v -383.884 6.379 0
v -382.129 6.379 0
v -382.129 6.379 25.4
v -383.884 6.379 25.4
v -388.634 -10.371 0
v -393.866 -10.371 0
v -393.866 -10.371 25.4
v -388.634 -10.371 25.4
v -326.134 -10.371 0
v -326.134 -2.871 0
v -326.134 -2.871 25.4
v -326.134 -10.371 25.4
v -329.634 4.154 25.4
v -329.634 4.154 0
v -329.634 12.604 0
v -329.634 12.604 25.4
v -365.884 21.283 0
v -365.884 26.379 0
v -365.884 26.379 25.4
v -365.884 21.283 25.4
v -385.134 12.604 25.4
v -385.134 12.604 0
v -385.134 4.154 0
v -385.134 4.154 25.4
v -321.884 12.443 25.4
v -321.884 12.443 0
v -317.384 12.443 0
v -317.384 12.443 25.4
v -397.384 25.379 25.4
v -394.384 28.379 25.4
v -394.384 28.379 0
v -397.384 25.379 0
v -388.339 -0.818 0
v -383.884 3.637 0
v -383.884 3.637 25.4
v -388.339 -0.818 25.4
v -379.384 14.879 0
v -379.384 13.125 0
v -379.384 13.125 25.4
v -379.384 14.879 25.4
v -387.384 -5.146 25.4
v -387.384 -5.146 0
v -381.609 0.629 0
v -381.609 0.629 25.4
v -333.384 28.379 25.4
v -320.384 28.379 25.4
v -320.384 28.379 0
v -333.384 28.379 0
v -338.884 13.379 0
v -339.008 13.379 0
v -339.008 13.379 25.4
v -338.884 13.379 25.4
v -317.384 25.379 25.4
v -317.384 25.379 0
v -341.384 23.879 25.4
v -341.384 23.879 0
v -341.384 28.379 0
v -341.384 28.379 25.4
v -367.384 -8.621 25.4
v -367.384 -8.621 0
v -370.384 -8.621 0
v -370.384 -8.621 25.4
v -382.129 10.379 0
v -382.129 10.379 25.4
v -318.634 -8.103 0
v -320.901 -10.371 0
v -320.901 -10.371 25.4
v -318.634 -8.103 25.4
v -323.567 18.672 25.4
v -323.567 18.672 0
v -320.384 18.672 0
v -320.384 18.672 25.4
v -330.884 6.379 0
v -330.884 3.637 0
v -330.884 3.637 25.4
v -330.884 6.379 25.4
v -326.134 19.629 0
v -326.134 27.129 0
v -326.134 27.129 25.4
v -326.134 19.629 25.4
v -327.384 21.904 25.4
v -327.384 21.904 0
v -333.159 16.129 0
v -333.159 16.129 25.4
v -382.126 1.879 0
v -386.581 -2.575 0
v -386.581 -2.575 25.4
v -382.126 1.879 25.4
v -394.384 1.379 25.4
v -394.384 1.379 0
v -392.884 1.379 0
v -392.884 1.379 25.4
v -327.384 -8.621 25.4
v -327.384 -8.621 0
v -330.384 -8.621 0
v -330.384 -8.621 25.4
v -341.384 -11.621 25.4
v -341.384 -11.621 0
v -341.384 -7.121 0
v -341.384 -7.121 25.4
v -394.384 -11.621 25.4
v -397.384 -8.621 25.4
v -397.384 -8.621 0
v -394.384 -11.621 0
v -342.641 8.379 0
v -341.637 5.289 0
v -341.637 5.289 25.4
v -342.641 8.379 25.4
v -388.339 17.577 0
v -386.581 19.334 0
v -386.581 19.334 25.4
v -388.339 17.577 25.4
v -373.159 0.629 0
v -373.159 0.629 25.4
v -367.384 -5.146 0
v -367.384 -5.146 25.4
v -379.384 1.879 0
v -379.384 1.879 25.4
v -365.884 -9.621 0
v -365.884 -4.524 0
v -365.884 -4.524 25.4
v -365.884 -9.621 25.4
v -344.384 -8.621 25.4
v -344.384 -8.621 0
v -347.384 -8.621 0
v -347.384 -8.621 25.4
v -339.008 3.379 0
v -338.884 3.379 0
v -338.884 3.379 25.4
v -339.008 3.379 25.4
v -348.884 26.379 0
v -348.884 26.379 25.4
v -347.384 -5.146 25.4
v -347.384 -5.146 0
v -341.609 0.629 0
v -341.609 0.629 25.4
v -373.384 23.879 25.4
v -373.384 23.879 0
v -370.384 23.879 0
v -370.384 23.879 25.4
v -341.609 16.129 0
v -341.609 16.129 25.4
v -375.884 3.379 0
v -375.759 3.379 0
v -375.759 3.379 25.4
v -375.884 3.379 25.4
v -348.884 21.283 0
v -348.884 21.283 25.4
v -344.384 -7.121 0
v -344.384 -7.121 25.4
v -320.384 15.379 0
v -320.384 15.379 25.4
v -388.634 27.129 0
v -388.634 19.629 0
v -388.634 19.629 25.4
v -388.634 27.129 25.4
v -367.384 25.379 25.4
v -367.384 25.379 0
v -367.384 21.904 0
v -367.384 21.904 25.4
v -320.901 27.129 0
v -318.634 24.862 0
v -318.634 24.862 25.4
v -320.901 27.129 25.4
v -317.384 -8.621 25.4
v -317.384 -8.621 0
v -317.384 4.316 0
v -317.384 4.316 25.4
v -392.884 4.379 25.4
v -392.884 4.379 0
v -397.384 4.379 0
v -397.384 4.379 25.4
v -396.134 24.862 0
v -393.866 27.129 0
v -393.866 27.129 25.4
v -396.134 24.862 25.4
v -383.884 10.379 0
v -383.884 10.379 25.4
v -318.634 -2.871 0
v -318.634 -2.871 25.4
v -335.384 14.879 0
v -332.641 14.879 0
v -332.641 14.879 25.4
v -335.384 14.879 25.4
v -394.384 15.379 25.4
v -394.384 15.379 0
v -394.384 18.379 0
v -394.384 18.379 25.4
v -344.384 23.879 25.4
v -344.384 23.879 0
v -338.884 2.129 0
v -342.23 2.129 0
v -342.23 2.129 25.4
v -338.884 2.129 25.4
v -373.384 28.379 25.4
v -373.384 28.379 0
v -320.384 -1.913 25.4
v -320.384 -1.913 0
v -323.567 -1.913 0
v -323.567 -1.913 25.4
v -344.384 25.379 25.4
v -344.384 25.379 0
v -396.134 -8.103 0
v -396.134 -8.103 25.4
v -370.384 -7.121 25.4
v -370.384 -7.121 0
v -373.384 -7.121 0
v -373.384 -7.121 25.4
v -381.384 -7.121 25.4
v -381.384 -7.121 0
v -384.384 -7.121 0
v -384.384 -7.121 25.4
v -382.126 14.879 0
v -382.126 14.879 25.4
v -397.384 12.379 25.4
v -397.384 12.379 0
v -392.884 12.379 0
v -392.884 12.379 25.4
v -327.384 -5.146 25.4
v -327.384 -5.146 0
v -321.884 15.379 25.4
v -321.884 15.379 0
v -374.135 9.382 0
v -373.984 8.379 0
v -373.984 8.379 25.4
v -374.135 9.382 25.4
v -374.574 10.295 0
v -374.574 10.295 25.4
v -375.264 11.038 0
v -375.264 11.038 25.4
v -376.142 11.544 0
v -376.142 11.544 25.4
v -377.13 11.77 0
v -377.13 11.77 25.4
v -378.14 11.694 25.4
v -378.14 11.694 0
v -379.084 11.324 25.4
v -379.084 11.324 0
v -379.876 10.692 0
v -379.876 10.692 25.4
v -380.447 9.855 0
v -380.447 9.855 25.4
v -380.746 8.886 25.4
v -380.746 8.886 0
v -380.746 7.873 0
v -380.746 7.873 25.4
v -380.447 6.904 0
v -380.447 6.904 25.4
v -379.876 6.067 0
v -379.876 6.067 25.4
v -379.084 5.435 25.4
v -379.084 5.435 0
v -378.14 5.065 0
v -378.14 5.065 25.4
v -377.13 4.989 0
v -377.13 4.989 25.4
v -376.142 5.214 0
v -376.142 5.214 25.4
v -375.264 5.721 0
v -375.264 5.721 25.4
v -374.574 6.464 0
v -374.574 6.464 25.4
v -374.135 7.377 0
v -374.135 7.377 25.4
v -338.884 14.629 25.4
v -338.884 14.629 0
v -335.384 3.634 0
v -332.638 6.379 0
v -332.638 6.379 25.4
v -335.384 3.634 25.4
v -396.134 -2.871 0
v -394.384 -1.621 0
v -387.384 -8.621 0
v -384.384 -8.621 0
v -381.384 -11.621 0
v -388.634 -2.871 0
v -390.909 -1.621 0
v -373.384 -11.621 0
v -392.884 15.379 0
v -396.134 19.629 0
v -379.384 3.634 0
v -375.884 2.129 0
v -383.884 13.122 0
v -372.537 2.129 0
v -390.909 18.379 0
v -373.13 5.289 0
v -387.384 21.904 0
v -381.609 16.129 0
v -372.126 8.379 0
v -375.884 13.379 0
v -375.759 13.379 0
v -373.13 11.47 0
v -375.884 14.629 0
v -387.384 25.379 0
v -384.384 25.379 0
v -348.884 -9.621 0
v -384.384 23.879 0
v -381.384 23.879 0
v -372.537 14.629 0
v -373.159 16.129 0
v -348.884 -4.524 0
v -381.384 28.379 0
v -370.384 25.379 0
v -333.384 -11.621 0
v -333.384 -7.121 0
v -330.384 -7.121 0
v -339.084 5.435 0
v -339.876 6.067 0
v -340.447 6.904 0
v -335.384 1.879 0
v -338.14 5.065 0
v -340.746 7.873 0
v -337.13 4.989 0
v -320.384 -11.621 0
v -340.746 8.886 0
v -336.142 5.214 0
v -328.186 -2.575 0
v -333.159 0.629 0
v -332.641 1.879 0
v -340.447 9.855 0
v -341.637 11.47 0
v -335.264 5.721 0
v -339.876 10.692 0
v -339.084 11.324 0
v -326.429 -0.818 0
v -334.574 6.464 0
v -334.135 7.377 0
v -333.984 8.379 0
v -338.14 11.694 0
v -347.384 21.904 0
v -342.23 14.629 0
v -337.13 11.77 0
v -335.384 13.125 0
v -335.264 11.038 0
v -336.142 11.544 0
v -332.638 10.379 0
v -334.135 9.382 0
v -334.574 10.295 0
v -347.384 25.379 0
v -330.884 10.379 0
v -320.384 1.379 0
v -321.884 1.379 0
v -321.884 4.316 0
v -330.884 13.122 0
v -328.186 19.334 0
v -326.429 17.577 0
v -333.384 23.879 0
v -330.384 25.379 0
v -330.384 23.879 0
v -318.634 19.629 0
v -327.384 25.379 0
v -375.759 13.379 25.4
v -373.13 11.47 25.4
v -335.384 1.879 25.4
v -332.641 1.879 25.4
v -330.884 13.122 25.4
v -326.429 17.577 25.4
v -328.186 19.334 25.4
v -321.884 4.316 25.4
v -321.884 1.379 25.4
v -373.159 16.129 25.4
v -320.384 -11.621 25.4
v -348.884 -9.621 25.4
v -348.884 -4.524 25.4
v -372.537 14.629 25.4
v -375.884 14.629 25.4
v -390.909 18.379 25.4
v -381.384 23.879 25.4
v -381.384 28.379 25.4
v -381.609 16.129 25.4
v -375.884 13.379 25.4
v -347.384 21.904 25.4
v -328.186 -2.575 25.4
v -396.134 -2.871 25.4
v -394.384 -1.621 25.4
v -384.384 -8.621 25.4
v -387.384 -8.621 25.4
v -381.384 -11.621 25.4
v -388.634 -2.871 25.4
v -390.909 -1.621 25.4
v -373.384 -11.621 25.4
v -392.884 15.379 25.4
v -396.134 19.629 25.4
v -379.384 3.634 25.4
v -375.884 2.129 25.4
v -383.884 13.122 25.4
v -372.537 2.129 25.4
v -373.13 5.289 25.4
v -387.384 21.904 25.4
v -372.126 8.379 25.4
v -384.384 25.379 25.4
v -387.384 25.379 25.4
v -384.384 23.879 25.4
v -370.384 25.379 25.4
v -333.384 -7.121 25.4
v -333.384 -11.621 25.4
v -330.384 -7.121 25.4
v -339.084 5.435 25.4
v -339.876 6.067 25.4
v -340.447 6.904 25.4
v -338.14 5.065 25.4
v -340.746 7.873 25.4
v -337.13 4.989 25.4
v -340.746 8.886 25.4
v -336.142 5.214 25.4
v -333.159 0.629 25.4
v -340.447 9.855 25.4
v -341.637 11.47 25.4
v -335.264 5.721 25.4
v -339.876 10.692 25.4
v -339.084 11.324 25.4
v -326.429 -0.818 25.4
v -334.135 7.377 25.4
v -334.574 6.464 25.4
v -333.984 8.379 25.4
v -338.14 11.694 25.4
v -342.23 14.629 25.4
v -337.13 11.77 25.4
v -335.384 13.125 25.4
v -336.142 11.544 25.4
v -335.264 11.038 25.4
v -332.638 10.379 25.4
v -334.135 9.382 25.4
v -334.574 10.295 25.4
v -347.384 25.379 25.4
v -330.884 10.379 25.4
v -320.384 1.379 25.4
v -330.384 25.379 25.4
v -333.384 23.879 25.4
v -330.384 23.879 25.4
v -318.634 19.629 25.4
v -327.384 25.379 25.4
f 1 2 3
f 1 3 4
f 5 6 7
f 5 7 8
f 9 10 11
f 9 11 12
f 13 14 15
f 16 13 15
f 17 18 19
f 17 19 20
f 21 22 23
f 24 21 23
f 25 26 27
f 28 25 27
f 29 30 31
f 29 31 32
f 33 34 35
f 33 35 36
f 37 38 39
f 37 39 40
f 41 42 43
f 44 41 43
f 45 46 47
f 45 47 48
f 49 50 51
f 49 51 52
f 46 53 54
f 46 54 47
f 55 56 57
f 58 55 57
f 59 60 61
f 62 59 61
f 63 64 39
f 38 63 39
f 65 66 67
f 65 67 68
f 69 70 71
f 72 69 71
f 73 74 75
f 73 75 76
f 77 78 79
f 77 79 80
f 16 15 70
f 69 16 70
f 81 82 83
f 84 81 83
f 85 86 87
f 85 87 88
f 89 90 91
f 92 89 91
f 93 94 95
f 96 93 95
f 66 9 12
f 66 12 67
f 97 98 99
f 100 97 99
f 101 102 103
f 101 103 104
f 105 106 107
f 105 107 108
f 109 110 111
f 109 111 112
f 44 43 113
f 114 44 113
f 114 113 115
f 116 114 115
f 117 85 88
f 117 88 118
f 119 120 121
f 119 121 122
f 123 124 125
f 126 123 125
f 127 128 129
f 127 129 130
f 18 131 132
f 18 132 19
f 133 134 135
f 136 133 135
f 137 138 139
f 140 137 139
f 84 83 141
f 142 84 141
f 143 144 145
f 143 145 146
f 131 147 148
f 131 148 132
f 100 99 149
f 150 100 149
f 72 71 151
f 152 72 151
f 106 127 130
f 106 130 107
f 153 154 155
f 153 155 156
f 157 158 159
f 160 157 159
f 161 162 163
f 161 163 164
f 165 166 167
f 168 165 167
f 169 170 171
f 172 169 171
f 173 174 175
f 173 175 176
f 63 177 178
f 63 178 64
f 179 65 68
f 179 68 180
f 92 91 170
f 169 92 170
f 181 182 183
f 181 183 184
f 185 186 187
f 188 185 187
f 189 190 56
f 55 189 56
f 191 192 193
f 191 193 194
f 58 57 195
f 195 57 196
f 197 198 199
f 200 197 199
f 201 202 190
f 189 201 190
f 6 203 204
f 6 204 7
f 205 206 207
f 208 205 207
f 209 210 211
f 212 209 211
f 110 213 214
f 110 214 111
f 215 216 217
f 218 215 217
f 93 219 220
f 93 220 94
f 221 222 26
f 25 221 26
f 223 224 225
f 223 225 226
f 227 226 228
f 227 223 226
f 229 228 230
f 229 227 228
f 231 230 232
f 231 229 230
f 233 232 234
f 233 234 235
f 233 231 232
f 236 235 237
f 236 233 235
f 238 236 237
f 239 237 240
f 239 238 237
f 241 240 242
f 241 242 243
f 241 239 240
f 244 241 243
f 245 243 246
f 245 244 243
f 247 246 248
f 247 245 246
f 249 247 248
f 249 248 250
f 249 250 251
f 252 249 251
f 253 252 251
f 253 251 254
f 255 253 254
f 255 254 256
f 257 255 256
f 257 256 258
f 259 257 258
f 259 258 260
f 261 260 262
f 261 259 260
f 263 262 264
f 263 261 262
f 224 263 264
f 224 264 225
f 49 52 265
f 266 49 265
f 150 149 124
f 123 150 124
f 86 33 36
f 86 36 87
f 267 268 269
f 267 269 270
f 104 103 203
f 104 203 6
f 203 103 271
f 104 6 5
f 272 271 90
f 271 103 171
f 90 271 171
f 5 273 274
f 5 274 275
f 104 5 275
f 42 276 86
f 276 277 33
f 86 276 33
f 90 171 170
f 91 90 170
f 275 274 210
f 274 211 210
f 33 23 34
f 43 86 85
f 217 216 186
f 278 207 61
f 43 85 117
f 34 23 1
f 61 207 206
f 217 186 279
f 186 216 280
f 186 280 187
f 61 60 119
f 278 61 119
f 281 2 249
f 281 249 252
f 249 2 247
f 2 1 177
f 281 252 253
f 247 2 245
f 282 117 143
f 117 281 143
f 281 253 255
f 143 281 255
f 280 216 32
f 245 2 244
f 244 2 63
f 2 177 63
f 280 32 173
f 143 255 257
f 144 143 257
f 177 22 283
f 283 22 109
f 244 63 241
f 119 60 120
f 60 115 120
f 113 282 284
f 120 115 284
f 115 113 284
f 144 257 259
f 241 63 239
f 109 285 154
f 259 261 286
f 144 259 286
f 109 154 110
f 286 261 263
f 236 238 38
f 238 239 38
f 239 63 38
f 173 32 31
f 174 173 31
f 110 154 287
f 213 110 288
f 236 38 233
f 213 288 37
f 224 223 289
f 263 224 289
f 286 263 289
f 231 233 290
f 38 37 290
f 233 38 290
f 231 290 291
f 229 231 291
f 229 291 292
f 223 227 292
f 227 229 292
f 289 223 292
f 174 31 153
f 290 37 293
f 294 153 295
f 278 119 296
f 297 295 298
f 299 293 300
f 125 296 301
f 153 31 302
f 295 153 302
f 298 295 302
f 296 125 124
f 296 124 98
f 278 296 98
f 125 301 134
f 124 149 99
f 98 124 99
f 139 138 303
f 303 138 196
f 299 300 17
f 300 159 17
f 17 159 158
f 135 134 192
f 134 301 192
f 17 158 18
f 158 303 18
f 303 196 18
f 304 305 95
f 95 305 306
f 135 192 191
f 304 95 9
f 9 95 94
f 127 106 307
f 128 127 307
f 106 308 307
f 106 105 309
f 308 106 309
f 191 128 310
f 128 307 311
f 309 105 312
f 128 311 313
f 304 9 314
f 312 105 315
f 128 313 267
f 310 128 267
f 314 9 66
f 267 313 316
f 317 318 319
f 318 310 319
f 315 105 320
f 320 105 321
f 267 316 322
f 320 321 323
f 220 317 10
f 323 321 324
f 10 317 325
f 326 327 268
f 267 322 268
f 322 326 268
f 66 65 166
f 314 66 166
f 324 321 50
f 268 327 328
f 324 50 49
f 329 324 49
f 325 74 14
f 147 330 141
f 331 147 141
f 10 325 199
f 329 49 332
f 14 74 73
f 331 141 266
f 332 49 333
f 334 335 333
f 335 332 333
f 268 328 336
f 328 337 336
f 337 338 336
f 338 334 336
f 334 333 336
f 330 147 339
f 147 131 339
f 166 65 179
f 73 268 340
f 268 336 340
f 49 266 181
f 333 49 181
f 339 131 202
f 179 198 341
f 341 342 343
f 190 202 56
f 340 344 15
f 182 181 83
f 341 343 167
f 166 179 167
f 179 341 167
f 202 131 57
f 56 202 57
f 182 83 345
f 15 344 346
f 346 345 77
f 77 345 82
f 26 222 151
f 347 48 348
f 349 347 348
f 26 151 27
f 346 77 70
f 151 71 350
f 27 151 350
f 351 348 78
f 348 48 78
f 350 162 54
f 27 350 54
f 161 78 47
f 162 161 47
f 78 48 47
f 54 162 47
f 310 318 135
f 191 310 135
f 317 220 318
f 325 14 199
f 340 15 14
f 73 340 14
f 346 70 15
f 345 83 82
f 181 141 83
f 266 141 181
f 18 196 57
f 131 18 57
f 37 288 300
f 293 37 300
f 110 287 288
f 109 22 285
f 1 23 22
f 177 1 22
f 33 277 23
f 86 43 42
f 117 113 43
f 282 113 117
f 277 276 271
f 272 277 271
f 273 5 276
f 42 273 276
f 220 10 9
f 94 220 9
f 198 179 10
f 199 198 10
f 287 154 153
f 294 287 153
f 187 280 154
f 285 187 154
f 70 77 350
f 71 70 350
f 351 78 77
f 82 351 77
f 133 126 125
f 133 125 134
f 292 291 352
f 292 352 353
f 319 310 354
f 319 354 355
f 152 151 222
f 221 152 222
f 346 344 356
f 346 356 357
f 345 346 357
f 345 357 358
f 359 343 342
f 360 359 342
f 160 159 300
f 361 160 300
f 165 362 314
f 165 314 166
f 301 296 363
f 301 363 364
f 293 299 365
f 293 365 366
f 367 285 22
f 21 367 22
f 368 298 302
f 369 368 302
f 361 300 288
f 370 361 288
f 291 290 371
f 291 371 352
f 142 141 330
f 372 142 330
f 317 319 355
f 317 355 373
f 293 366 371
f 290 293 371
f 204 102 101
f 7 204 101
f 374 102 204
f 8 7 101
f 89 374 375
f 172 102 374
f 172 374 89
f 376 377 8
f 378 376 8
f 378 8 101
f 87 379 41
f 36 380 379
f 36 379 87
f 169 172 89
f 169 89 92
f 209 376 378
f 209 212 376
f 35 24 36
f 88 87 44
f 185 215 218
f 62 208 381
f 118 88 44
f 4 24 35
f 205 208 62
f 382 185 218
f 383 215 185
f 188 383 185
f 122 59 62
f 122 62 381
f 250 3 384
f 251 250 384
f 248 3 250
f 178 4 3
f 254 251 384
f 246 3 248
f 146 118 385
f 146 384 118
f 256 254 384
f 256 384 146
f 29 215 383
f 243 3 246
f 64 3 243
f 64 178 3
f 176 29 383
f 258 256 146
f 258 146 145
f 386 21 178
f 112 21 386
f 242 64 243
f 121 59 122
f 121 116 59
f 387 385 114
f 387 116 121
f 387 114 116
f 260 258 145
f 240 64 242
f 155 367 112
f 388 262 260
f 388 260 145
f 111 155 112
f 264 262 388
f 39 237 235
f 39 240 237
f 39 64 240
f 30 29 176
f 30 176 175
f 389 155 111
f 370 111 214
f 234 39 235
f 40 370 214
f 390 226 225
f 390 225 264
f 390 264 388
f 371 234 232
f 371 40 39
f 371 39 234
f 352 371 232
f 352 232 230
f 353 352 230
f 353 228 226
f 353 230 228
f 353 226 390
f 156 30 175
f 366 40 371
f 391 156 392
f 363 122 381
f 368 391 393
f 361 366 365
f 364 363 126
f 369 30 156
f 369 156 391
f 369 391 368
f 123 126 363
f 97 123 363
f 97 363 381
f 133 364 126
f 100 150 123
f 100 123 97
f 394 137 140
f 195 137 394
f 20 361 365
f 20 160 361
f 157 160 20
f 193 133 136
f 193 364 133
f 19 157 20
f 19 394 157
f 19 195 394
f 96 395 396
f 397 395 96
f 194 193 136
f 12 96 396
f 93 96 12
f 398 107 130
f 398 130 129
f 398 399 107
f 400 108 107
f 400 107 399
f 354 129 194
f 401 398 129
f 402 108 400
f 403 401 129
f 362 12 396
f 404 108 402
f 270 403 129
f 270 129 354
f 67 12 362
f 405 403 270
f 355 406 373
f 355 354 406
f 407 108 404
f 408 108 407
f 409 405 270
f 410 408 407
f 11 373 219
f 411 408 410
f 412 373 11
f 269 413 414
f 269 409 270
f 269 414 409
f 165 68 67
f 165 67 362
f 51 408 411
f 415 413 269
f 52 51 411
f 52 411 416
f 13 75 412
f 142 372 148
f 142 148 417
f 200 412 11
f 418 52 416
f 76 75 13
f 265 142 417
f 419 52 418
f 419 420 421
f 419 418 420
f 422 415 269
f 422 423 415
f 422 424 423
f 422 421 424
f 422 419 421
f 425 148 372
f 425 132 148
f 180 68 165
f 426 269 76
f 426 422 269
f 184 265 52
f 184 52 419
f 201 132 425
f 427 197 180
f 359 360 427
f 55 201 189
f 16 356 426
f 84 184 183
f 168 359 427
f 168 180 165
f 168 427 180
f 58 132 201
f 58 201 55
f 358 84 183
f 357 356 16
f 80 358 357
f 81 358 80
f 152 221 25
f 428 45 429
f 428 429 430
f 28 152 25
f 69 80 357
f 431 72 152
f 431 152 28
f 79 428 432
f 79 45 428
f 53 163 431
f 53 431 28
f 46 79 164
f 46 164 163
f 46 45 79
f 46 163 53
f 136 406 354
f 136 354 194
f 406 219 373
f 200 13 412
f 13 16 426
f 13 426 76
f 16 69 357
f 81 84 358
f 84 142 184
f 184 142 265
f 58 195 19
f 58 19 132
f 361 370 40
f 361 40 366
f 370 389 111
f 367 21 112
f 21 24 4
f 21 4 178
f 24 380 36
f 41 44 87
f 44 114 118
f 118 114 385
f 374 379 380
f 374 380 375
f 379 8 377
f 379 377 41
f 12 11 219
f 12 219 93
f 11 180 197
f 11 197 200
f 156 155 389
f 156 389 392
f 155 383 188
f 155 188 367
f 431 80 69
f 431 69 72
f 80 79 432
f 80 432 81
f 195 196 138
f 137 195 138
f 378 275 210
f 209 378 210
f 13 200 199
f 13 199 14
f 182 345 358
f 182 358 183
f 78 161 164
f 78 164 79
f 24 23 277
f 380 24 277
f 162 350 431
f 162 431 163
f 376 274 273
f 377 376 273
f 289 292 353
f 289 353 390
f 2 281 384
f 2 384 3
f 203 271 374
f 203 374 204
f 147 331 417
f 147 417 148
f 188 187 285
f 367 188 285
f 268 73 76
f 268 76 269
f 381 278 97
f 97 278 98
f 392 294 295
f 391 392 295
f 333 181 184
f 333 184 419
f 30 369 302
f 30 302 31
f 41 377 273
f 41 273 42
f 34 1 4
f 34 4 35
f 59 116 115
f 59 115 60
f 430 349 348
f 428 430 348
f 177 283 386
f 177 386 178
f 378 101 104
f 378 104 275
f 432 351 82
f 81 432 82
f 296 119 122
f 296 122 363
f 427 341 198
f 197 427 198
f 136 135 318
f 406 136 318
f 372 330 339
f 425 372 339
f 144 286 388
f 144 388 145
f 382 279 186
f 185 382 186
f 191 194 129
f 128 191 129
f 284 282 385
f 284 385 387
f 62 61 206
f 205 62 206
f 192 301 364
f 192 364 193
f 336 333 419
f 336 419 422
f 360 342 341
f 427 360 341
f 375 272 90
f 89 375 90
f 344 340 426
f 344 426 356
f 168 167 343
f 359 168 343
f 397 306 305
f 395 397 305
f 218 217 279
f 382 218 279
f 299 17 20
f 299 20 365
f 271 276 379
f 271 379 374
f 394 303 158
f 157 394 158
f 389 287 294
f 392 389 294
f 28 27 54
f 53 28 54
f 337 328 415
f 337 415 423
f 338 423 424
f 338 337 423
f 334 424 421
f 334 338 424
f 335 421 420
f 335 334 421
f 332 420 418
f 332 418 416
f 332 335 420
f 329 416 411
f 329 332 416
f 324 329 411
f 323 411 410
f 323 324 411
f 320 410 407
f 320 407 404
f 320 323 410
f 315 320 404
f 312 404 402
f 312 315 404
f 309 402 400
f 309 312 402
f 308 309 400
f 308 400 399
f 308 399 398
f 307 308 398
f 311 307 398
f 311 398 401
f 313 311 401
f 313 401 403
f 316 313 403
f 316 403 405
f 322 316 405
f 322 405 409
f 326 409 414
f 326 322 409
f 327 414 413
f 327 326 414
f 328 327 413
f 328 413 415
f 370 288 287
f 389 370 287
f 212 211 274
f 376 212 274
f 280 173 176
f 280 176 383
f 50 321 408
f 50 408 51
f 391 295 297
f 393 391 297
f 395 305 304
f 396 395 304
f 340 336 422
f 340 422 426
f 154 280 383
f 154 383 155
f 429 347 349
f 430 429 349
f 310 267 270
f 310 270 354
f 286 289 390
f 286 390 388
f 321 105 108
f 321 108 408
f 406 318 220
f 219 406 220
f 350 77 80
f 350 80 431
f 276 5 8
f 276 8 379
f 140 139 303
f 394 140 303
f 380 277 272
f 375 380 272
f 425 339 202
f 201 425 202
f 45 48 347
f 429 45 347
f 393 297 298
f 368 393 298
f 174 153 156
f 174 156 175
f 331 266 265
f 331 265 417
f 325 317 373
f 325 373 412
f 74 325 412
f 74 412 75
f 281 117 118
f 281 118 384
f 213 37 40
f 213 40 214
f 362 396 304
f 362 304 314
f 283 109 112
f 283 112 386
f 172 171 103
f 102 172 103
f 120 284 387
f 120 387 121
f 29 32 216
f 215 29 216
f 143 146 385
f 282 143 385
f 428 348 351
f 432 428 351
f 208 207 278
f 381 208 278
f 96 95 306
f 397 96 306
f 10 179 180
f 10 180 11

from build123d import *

# Parameters (mm, degrees)
SKETCH1_R      = 3.4
EXTRUDE1_DEPTH = 25.4


with BuildPart() as part:
    # Sketch1 → Extrude1 (new body)
    with BuildSketch(Plane.XY):
        Polygon((-367.383665724, -5.145535609), (-367.383665724, -8.620535609), (-370.383665724, -8.620535609), (-370.383665724, -7.120535609), (-373.383665724, -7.120535609), (-373.383665724, -11.620535609), (-341.383665724, -11.620535609), (-341.383665724, -7.120535609), (-344.383665724, -7.120535609), (-344.383665724, -8.620535609), (-347.383665724, -8.620535609), (-347.383665724, -5.145535609), (-341.608665724, 0.629464391), (-333.158665724, 0.629464391), (-327.383665724, -5.145535609), (-327.383665724, -8.620535609), (-330.383665724, -8.620535609), (-330.383665724, -7.120535609), (-333.383665724, -7.120535609), (-333.383665724, -11.620535609), (-320.383665724, -11.620535609), (-317.383665724, -8.620535609), (-317.383665724, 4.315964391), (-321.883665724, 4.315964391), (-321.883665724, 1.379464391), (-320.383665724, 1.379464391), (-320.383665724, -1.912635609), (-323.566565724, -1.912635609), (-329.633665724, 4.154464391), (-329.633665724, 12.604464391), (-323.566565724, 18.671564391), (-320.383665724, 18.671564391), (-320.383665724, 15.379464391), (-321.883665724, 15.379464391), (-321.883665724, 12.442964391), (-317.383665724, 12.442964391), (-317.383665724, 25.379464391), (-320.383665724, 28.379464391), (-333.383665724, 28.379464391), (-333.383665724, 23.879464391), (-330.383665724, 23.879464391), (-330.383665724, 25.379464391), (-327.383665724, 25.379464391), (-327.383665724, 21.904464391), (-333.158665724, 16.129464391), (-341.608665724, 16.129464391), (-347.383665724, 21.904464391), (-347.383665724, 25.379464391), (-344.383665724, 25.379464391), (-344.383665724, 23.879464391), (-341.383665724, 23.879464391), (-341.383665724, 28.379464391), (-373.383665724, 28.379464391), (-373.383665724, 23.879464391), (-370.383665724, 23.879464391), (-370.383665724, 25.379464391), (-367.383665724, 25.379464391), (-367.383665724, 21.904464391), (-373.158665724, 16.129464391), (-381.608665724, 16.129464391), (-387.383665724, 21.904464391), (-387.383665724, 25.379464391), (-384.383665724, 25.379464391), (-384.383665724, 23.879464391), (-381.383665724, 23.879464391), (-381.383665724, 28.379464391), (-394.383665724, 28.379464391), (-397.383665724, 25.379464391), (-397.383665724, 12.379464391), (-392.883665724, 12.379464391), (-392.883665724, 15.379464391), (-394.383665724, 15.379464391), (-394.383665724, 18.379464391), (-390.908665724, 18.379464391), (-385.133665724, 12.604464391), (-385.133665724, 4.154464391), (-390.908665724, -1.620535609), (-394.383665724, -1.620535609), (-394.383665724, 1.379464391), (-392.883665724, 1.379464391), (-392.883665724, 4.379464391), (-397.383665724, 4.379464391), (-397.383665724, -8.620535609), (-394.383665724, -11.620535609), (-381.383665724, -11.620535609), (-381.383665724, -7.120535609), (-384.383665724, -7.120535609), (-384.383665724, -8.620535609), (-387.383665724, -8.620535609), (-387.383665724, -5.145535609), (-381.608665724, 0.629464391), (-373.158665724, 0.629464391), align=None)
        with Locations((-337.383665724, 8.379464391)):
            Circle(SKETCH1_R, mode=Mode.SUBTRACT)
        with Locations((-377.383665724, 8.379464391)):
            Circle(SKETCH1_R, mode=Mode.SUBTRACT)
        Polygon((-373.130411724, 11.469634391), (-372.126354724, 8.379464391), (-373.130411724, 5.289294391), (-375.759067724, 3.379464391), (-375.883665724, 3.379464391), (-375.883665724, 2.129464391), (-372.537345724, 2.129464391), (-365.883665724, -4.524215609), (-365.883665724, -9.620535609), (-348.883665724, -9.620535609), (-348.883665724, -4.524215609), (-342.229985724, 2.129464391), (-338.883665724, 2.129464391), (-338.883665724, 3.379464391), (-339.008263724, 3.379464391), (-341.636919724, 5.289294391), (-342.640976724, 8.379464391), (-341.636919724, 11.469634391), (-339.008263724, 13.379464391), (-338.883665724, 13.379464391), (-338.883665724, 14.629464391), (-342.229985724, 14.629464391), (-348.883665724, 21.283144391), (-348.883665724, 26.379464391), (-365.883665724, 26.379464391), (-365.883665724, 21.283144391), (-372.537345724, 14.629464391), (-375.883665724, 14.629464391), (-375.883665724, 13.379464391), (-375.759067724, 13.379464391), align=None, mode=Mode.SUBTRACT)
        Polygon((-382.126432724, 14.879464391), (-386.581320724, 19.334352391), (-388.338553724, 17.577119391), (-383.883665724, 13.122231391), (-383.883665724, 10.379464391), (-382.129453724, 10.379464391), (-379.383665724, 13.125252391), (-379.383665724, 14.879464391), align=None, mode=Mode.SUBTRACT)
        Polygon((-332.640898724, 1.879464391), (-328.186010724, -2.575423609), (-326.428777724, -0.818190609), (-330.883665724, 3.636697391), (-330.883665724, 6.379464391), (-332.637877724, 6.379464391), (-335.383665724, 3.633676391), (-335.383665724, 1.879464391), align=None, mode=Mode.SUBTRACT)
        Polygon((-383.883665724, 3.636697391), (-388.338553724, -0.818190609), (-386.581320724, -2.575423609), (-382.126432724, 1.879464391), (-379.383665724, 1.879464391), (-379.383665724, 3.633676391), (-382.129453724, 6.379464391), (-383.883665724, 6.379464391), align=None, mode=Mode.SUBTRACT)
        Polygon((-330.883665724, 13.122231391), (-326.428777724, 17.577119391), (-328.186010724, 19.334352391), (-332.640898724, 14.879464391), (-335.383665724, 14.879464391), (-335.383665724, 13.125252391), (-332.637877724, 10.379464391), (-330.883665724, 10.379464391), align=None, mode=Mode.SUBTRACT)
        Polygon((-393.865898724, 27.129464391), (-396.133665724, 24.861697391), (-396.133665724, 19.629464391), (-388.633665724, 19.629464391), (-388.633665724, 27.129464391), align=None, mode=Mode.SUBTRACT)
        Polygon((-320.901432724, -10.370535609), (-318.633665724, -8.102768609), (-318.633665724, -2.870535609), (-326.133665724, -2.870535609), (-326.133665724, -10.370535609), align=None, mode=Mode.SUBTRACT)
        Polygon((-396.133665724, -2.870535609), (-396.133665724, -8.102768609), (-393.865898724, -10.370535609), (-388.633665724, -10.370535609), (-388.633665724, -2.870535609), align=None, mode=Mode.SUBTRACT)
        Polygon((-318.633665724, 19.629464391), (-318.633665724, 24.861697391), (-320.901432724, 27.129464391), (-326.133665724, 27.129464391), (-326.133665724, 19.629464391), align=None, mode=Mode.SUBTRACT)
    extrude(amount=EXTRUDE1_DEPTH)


solid = part.part
